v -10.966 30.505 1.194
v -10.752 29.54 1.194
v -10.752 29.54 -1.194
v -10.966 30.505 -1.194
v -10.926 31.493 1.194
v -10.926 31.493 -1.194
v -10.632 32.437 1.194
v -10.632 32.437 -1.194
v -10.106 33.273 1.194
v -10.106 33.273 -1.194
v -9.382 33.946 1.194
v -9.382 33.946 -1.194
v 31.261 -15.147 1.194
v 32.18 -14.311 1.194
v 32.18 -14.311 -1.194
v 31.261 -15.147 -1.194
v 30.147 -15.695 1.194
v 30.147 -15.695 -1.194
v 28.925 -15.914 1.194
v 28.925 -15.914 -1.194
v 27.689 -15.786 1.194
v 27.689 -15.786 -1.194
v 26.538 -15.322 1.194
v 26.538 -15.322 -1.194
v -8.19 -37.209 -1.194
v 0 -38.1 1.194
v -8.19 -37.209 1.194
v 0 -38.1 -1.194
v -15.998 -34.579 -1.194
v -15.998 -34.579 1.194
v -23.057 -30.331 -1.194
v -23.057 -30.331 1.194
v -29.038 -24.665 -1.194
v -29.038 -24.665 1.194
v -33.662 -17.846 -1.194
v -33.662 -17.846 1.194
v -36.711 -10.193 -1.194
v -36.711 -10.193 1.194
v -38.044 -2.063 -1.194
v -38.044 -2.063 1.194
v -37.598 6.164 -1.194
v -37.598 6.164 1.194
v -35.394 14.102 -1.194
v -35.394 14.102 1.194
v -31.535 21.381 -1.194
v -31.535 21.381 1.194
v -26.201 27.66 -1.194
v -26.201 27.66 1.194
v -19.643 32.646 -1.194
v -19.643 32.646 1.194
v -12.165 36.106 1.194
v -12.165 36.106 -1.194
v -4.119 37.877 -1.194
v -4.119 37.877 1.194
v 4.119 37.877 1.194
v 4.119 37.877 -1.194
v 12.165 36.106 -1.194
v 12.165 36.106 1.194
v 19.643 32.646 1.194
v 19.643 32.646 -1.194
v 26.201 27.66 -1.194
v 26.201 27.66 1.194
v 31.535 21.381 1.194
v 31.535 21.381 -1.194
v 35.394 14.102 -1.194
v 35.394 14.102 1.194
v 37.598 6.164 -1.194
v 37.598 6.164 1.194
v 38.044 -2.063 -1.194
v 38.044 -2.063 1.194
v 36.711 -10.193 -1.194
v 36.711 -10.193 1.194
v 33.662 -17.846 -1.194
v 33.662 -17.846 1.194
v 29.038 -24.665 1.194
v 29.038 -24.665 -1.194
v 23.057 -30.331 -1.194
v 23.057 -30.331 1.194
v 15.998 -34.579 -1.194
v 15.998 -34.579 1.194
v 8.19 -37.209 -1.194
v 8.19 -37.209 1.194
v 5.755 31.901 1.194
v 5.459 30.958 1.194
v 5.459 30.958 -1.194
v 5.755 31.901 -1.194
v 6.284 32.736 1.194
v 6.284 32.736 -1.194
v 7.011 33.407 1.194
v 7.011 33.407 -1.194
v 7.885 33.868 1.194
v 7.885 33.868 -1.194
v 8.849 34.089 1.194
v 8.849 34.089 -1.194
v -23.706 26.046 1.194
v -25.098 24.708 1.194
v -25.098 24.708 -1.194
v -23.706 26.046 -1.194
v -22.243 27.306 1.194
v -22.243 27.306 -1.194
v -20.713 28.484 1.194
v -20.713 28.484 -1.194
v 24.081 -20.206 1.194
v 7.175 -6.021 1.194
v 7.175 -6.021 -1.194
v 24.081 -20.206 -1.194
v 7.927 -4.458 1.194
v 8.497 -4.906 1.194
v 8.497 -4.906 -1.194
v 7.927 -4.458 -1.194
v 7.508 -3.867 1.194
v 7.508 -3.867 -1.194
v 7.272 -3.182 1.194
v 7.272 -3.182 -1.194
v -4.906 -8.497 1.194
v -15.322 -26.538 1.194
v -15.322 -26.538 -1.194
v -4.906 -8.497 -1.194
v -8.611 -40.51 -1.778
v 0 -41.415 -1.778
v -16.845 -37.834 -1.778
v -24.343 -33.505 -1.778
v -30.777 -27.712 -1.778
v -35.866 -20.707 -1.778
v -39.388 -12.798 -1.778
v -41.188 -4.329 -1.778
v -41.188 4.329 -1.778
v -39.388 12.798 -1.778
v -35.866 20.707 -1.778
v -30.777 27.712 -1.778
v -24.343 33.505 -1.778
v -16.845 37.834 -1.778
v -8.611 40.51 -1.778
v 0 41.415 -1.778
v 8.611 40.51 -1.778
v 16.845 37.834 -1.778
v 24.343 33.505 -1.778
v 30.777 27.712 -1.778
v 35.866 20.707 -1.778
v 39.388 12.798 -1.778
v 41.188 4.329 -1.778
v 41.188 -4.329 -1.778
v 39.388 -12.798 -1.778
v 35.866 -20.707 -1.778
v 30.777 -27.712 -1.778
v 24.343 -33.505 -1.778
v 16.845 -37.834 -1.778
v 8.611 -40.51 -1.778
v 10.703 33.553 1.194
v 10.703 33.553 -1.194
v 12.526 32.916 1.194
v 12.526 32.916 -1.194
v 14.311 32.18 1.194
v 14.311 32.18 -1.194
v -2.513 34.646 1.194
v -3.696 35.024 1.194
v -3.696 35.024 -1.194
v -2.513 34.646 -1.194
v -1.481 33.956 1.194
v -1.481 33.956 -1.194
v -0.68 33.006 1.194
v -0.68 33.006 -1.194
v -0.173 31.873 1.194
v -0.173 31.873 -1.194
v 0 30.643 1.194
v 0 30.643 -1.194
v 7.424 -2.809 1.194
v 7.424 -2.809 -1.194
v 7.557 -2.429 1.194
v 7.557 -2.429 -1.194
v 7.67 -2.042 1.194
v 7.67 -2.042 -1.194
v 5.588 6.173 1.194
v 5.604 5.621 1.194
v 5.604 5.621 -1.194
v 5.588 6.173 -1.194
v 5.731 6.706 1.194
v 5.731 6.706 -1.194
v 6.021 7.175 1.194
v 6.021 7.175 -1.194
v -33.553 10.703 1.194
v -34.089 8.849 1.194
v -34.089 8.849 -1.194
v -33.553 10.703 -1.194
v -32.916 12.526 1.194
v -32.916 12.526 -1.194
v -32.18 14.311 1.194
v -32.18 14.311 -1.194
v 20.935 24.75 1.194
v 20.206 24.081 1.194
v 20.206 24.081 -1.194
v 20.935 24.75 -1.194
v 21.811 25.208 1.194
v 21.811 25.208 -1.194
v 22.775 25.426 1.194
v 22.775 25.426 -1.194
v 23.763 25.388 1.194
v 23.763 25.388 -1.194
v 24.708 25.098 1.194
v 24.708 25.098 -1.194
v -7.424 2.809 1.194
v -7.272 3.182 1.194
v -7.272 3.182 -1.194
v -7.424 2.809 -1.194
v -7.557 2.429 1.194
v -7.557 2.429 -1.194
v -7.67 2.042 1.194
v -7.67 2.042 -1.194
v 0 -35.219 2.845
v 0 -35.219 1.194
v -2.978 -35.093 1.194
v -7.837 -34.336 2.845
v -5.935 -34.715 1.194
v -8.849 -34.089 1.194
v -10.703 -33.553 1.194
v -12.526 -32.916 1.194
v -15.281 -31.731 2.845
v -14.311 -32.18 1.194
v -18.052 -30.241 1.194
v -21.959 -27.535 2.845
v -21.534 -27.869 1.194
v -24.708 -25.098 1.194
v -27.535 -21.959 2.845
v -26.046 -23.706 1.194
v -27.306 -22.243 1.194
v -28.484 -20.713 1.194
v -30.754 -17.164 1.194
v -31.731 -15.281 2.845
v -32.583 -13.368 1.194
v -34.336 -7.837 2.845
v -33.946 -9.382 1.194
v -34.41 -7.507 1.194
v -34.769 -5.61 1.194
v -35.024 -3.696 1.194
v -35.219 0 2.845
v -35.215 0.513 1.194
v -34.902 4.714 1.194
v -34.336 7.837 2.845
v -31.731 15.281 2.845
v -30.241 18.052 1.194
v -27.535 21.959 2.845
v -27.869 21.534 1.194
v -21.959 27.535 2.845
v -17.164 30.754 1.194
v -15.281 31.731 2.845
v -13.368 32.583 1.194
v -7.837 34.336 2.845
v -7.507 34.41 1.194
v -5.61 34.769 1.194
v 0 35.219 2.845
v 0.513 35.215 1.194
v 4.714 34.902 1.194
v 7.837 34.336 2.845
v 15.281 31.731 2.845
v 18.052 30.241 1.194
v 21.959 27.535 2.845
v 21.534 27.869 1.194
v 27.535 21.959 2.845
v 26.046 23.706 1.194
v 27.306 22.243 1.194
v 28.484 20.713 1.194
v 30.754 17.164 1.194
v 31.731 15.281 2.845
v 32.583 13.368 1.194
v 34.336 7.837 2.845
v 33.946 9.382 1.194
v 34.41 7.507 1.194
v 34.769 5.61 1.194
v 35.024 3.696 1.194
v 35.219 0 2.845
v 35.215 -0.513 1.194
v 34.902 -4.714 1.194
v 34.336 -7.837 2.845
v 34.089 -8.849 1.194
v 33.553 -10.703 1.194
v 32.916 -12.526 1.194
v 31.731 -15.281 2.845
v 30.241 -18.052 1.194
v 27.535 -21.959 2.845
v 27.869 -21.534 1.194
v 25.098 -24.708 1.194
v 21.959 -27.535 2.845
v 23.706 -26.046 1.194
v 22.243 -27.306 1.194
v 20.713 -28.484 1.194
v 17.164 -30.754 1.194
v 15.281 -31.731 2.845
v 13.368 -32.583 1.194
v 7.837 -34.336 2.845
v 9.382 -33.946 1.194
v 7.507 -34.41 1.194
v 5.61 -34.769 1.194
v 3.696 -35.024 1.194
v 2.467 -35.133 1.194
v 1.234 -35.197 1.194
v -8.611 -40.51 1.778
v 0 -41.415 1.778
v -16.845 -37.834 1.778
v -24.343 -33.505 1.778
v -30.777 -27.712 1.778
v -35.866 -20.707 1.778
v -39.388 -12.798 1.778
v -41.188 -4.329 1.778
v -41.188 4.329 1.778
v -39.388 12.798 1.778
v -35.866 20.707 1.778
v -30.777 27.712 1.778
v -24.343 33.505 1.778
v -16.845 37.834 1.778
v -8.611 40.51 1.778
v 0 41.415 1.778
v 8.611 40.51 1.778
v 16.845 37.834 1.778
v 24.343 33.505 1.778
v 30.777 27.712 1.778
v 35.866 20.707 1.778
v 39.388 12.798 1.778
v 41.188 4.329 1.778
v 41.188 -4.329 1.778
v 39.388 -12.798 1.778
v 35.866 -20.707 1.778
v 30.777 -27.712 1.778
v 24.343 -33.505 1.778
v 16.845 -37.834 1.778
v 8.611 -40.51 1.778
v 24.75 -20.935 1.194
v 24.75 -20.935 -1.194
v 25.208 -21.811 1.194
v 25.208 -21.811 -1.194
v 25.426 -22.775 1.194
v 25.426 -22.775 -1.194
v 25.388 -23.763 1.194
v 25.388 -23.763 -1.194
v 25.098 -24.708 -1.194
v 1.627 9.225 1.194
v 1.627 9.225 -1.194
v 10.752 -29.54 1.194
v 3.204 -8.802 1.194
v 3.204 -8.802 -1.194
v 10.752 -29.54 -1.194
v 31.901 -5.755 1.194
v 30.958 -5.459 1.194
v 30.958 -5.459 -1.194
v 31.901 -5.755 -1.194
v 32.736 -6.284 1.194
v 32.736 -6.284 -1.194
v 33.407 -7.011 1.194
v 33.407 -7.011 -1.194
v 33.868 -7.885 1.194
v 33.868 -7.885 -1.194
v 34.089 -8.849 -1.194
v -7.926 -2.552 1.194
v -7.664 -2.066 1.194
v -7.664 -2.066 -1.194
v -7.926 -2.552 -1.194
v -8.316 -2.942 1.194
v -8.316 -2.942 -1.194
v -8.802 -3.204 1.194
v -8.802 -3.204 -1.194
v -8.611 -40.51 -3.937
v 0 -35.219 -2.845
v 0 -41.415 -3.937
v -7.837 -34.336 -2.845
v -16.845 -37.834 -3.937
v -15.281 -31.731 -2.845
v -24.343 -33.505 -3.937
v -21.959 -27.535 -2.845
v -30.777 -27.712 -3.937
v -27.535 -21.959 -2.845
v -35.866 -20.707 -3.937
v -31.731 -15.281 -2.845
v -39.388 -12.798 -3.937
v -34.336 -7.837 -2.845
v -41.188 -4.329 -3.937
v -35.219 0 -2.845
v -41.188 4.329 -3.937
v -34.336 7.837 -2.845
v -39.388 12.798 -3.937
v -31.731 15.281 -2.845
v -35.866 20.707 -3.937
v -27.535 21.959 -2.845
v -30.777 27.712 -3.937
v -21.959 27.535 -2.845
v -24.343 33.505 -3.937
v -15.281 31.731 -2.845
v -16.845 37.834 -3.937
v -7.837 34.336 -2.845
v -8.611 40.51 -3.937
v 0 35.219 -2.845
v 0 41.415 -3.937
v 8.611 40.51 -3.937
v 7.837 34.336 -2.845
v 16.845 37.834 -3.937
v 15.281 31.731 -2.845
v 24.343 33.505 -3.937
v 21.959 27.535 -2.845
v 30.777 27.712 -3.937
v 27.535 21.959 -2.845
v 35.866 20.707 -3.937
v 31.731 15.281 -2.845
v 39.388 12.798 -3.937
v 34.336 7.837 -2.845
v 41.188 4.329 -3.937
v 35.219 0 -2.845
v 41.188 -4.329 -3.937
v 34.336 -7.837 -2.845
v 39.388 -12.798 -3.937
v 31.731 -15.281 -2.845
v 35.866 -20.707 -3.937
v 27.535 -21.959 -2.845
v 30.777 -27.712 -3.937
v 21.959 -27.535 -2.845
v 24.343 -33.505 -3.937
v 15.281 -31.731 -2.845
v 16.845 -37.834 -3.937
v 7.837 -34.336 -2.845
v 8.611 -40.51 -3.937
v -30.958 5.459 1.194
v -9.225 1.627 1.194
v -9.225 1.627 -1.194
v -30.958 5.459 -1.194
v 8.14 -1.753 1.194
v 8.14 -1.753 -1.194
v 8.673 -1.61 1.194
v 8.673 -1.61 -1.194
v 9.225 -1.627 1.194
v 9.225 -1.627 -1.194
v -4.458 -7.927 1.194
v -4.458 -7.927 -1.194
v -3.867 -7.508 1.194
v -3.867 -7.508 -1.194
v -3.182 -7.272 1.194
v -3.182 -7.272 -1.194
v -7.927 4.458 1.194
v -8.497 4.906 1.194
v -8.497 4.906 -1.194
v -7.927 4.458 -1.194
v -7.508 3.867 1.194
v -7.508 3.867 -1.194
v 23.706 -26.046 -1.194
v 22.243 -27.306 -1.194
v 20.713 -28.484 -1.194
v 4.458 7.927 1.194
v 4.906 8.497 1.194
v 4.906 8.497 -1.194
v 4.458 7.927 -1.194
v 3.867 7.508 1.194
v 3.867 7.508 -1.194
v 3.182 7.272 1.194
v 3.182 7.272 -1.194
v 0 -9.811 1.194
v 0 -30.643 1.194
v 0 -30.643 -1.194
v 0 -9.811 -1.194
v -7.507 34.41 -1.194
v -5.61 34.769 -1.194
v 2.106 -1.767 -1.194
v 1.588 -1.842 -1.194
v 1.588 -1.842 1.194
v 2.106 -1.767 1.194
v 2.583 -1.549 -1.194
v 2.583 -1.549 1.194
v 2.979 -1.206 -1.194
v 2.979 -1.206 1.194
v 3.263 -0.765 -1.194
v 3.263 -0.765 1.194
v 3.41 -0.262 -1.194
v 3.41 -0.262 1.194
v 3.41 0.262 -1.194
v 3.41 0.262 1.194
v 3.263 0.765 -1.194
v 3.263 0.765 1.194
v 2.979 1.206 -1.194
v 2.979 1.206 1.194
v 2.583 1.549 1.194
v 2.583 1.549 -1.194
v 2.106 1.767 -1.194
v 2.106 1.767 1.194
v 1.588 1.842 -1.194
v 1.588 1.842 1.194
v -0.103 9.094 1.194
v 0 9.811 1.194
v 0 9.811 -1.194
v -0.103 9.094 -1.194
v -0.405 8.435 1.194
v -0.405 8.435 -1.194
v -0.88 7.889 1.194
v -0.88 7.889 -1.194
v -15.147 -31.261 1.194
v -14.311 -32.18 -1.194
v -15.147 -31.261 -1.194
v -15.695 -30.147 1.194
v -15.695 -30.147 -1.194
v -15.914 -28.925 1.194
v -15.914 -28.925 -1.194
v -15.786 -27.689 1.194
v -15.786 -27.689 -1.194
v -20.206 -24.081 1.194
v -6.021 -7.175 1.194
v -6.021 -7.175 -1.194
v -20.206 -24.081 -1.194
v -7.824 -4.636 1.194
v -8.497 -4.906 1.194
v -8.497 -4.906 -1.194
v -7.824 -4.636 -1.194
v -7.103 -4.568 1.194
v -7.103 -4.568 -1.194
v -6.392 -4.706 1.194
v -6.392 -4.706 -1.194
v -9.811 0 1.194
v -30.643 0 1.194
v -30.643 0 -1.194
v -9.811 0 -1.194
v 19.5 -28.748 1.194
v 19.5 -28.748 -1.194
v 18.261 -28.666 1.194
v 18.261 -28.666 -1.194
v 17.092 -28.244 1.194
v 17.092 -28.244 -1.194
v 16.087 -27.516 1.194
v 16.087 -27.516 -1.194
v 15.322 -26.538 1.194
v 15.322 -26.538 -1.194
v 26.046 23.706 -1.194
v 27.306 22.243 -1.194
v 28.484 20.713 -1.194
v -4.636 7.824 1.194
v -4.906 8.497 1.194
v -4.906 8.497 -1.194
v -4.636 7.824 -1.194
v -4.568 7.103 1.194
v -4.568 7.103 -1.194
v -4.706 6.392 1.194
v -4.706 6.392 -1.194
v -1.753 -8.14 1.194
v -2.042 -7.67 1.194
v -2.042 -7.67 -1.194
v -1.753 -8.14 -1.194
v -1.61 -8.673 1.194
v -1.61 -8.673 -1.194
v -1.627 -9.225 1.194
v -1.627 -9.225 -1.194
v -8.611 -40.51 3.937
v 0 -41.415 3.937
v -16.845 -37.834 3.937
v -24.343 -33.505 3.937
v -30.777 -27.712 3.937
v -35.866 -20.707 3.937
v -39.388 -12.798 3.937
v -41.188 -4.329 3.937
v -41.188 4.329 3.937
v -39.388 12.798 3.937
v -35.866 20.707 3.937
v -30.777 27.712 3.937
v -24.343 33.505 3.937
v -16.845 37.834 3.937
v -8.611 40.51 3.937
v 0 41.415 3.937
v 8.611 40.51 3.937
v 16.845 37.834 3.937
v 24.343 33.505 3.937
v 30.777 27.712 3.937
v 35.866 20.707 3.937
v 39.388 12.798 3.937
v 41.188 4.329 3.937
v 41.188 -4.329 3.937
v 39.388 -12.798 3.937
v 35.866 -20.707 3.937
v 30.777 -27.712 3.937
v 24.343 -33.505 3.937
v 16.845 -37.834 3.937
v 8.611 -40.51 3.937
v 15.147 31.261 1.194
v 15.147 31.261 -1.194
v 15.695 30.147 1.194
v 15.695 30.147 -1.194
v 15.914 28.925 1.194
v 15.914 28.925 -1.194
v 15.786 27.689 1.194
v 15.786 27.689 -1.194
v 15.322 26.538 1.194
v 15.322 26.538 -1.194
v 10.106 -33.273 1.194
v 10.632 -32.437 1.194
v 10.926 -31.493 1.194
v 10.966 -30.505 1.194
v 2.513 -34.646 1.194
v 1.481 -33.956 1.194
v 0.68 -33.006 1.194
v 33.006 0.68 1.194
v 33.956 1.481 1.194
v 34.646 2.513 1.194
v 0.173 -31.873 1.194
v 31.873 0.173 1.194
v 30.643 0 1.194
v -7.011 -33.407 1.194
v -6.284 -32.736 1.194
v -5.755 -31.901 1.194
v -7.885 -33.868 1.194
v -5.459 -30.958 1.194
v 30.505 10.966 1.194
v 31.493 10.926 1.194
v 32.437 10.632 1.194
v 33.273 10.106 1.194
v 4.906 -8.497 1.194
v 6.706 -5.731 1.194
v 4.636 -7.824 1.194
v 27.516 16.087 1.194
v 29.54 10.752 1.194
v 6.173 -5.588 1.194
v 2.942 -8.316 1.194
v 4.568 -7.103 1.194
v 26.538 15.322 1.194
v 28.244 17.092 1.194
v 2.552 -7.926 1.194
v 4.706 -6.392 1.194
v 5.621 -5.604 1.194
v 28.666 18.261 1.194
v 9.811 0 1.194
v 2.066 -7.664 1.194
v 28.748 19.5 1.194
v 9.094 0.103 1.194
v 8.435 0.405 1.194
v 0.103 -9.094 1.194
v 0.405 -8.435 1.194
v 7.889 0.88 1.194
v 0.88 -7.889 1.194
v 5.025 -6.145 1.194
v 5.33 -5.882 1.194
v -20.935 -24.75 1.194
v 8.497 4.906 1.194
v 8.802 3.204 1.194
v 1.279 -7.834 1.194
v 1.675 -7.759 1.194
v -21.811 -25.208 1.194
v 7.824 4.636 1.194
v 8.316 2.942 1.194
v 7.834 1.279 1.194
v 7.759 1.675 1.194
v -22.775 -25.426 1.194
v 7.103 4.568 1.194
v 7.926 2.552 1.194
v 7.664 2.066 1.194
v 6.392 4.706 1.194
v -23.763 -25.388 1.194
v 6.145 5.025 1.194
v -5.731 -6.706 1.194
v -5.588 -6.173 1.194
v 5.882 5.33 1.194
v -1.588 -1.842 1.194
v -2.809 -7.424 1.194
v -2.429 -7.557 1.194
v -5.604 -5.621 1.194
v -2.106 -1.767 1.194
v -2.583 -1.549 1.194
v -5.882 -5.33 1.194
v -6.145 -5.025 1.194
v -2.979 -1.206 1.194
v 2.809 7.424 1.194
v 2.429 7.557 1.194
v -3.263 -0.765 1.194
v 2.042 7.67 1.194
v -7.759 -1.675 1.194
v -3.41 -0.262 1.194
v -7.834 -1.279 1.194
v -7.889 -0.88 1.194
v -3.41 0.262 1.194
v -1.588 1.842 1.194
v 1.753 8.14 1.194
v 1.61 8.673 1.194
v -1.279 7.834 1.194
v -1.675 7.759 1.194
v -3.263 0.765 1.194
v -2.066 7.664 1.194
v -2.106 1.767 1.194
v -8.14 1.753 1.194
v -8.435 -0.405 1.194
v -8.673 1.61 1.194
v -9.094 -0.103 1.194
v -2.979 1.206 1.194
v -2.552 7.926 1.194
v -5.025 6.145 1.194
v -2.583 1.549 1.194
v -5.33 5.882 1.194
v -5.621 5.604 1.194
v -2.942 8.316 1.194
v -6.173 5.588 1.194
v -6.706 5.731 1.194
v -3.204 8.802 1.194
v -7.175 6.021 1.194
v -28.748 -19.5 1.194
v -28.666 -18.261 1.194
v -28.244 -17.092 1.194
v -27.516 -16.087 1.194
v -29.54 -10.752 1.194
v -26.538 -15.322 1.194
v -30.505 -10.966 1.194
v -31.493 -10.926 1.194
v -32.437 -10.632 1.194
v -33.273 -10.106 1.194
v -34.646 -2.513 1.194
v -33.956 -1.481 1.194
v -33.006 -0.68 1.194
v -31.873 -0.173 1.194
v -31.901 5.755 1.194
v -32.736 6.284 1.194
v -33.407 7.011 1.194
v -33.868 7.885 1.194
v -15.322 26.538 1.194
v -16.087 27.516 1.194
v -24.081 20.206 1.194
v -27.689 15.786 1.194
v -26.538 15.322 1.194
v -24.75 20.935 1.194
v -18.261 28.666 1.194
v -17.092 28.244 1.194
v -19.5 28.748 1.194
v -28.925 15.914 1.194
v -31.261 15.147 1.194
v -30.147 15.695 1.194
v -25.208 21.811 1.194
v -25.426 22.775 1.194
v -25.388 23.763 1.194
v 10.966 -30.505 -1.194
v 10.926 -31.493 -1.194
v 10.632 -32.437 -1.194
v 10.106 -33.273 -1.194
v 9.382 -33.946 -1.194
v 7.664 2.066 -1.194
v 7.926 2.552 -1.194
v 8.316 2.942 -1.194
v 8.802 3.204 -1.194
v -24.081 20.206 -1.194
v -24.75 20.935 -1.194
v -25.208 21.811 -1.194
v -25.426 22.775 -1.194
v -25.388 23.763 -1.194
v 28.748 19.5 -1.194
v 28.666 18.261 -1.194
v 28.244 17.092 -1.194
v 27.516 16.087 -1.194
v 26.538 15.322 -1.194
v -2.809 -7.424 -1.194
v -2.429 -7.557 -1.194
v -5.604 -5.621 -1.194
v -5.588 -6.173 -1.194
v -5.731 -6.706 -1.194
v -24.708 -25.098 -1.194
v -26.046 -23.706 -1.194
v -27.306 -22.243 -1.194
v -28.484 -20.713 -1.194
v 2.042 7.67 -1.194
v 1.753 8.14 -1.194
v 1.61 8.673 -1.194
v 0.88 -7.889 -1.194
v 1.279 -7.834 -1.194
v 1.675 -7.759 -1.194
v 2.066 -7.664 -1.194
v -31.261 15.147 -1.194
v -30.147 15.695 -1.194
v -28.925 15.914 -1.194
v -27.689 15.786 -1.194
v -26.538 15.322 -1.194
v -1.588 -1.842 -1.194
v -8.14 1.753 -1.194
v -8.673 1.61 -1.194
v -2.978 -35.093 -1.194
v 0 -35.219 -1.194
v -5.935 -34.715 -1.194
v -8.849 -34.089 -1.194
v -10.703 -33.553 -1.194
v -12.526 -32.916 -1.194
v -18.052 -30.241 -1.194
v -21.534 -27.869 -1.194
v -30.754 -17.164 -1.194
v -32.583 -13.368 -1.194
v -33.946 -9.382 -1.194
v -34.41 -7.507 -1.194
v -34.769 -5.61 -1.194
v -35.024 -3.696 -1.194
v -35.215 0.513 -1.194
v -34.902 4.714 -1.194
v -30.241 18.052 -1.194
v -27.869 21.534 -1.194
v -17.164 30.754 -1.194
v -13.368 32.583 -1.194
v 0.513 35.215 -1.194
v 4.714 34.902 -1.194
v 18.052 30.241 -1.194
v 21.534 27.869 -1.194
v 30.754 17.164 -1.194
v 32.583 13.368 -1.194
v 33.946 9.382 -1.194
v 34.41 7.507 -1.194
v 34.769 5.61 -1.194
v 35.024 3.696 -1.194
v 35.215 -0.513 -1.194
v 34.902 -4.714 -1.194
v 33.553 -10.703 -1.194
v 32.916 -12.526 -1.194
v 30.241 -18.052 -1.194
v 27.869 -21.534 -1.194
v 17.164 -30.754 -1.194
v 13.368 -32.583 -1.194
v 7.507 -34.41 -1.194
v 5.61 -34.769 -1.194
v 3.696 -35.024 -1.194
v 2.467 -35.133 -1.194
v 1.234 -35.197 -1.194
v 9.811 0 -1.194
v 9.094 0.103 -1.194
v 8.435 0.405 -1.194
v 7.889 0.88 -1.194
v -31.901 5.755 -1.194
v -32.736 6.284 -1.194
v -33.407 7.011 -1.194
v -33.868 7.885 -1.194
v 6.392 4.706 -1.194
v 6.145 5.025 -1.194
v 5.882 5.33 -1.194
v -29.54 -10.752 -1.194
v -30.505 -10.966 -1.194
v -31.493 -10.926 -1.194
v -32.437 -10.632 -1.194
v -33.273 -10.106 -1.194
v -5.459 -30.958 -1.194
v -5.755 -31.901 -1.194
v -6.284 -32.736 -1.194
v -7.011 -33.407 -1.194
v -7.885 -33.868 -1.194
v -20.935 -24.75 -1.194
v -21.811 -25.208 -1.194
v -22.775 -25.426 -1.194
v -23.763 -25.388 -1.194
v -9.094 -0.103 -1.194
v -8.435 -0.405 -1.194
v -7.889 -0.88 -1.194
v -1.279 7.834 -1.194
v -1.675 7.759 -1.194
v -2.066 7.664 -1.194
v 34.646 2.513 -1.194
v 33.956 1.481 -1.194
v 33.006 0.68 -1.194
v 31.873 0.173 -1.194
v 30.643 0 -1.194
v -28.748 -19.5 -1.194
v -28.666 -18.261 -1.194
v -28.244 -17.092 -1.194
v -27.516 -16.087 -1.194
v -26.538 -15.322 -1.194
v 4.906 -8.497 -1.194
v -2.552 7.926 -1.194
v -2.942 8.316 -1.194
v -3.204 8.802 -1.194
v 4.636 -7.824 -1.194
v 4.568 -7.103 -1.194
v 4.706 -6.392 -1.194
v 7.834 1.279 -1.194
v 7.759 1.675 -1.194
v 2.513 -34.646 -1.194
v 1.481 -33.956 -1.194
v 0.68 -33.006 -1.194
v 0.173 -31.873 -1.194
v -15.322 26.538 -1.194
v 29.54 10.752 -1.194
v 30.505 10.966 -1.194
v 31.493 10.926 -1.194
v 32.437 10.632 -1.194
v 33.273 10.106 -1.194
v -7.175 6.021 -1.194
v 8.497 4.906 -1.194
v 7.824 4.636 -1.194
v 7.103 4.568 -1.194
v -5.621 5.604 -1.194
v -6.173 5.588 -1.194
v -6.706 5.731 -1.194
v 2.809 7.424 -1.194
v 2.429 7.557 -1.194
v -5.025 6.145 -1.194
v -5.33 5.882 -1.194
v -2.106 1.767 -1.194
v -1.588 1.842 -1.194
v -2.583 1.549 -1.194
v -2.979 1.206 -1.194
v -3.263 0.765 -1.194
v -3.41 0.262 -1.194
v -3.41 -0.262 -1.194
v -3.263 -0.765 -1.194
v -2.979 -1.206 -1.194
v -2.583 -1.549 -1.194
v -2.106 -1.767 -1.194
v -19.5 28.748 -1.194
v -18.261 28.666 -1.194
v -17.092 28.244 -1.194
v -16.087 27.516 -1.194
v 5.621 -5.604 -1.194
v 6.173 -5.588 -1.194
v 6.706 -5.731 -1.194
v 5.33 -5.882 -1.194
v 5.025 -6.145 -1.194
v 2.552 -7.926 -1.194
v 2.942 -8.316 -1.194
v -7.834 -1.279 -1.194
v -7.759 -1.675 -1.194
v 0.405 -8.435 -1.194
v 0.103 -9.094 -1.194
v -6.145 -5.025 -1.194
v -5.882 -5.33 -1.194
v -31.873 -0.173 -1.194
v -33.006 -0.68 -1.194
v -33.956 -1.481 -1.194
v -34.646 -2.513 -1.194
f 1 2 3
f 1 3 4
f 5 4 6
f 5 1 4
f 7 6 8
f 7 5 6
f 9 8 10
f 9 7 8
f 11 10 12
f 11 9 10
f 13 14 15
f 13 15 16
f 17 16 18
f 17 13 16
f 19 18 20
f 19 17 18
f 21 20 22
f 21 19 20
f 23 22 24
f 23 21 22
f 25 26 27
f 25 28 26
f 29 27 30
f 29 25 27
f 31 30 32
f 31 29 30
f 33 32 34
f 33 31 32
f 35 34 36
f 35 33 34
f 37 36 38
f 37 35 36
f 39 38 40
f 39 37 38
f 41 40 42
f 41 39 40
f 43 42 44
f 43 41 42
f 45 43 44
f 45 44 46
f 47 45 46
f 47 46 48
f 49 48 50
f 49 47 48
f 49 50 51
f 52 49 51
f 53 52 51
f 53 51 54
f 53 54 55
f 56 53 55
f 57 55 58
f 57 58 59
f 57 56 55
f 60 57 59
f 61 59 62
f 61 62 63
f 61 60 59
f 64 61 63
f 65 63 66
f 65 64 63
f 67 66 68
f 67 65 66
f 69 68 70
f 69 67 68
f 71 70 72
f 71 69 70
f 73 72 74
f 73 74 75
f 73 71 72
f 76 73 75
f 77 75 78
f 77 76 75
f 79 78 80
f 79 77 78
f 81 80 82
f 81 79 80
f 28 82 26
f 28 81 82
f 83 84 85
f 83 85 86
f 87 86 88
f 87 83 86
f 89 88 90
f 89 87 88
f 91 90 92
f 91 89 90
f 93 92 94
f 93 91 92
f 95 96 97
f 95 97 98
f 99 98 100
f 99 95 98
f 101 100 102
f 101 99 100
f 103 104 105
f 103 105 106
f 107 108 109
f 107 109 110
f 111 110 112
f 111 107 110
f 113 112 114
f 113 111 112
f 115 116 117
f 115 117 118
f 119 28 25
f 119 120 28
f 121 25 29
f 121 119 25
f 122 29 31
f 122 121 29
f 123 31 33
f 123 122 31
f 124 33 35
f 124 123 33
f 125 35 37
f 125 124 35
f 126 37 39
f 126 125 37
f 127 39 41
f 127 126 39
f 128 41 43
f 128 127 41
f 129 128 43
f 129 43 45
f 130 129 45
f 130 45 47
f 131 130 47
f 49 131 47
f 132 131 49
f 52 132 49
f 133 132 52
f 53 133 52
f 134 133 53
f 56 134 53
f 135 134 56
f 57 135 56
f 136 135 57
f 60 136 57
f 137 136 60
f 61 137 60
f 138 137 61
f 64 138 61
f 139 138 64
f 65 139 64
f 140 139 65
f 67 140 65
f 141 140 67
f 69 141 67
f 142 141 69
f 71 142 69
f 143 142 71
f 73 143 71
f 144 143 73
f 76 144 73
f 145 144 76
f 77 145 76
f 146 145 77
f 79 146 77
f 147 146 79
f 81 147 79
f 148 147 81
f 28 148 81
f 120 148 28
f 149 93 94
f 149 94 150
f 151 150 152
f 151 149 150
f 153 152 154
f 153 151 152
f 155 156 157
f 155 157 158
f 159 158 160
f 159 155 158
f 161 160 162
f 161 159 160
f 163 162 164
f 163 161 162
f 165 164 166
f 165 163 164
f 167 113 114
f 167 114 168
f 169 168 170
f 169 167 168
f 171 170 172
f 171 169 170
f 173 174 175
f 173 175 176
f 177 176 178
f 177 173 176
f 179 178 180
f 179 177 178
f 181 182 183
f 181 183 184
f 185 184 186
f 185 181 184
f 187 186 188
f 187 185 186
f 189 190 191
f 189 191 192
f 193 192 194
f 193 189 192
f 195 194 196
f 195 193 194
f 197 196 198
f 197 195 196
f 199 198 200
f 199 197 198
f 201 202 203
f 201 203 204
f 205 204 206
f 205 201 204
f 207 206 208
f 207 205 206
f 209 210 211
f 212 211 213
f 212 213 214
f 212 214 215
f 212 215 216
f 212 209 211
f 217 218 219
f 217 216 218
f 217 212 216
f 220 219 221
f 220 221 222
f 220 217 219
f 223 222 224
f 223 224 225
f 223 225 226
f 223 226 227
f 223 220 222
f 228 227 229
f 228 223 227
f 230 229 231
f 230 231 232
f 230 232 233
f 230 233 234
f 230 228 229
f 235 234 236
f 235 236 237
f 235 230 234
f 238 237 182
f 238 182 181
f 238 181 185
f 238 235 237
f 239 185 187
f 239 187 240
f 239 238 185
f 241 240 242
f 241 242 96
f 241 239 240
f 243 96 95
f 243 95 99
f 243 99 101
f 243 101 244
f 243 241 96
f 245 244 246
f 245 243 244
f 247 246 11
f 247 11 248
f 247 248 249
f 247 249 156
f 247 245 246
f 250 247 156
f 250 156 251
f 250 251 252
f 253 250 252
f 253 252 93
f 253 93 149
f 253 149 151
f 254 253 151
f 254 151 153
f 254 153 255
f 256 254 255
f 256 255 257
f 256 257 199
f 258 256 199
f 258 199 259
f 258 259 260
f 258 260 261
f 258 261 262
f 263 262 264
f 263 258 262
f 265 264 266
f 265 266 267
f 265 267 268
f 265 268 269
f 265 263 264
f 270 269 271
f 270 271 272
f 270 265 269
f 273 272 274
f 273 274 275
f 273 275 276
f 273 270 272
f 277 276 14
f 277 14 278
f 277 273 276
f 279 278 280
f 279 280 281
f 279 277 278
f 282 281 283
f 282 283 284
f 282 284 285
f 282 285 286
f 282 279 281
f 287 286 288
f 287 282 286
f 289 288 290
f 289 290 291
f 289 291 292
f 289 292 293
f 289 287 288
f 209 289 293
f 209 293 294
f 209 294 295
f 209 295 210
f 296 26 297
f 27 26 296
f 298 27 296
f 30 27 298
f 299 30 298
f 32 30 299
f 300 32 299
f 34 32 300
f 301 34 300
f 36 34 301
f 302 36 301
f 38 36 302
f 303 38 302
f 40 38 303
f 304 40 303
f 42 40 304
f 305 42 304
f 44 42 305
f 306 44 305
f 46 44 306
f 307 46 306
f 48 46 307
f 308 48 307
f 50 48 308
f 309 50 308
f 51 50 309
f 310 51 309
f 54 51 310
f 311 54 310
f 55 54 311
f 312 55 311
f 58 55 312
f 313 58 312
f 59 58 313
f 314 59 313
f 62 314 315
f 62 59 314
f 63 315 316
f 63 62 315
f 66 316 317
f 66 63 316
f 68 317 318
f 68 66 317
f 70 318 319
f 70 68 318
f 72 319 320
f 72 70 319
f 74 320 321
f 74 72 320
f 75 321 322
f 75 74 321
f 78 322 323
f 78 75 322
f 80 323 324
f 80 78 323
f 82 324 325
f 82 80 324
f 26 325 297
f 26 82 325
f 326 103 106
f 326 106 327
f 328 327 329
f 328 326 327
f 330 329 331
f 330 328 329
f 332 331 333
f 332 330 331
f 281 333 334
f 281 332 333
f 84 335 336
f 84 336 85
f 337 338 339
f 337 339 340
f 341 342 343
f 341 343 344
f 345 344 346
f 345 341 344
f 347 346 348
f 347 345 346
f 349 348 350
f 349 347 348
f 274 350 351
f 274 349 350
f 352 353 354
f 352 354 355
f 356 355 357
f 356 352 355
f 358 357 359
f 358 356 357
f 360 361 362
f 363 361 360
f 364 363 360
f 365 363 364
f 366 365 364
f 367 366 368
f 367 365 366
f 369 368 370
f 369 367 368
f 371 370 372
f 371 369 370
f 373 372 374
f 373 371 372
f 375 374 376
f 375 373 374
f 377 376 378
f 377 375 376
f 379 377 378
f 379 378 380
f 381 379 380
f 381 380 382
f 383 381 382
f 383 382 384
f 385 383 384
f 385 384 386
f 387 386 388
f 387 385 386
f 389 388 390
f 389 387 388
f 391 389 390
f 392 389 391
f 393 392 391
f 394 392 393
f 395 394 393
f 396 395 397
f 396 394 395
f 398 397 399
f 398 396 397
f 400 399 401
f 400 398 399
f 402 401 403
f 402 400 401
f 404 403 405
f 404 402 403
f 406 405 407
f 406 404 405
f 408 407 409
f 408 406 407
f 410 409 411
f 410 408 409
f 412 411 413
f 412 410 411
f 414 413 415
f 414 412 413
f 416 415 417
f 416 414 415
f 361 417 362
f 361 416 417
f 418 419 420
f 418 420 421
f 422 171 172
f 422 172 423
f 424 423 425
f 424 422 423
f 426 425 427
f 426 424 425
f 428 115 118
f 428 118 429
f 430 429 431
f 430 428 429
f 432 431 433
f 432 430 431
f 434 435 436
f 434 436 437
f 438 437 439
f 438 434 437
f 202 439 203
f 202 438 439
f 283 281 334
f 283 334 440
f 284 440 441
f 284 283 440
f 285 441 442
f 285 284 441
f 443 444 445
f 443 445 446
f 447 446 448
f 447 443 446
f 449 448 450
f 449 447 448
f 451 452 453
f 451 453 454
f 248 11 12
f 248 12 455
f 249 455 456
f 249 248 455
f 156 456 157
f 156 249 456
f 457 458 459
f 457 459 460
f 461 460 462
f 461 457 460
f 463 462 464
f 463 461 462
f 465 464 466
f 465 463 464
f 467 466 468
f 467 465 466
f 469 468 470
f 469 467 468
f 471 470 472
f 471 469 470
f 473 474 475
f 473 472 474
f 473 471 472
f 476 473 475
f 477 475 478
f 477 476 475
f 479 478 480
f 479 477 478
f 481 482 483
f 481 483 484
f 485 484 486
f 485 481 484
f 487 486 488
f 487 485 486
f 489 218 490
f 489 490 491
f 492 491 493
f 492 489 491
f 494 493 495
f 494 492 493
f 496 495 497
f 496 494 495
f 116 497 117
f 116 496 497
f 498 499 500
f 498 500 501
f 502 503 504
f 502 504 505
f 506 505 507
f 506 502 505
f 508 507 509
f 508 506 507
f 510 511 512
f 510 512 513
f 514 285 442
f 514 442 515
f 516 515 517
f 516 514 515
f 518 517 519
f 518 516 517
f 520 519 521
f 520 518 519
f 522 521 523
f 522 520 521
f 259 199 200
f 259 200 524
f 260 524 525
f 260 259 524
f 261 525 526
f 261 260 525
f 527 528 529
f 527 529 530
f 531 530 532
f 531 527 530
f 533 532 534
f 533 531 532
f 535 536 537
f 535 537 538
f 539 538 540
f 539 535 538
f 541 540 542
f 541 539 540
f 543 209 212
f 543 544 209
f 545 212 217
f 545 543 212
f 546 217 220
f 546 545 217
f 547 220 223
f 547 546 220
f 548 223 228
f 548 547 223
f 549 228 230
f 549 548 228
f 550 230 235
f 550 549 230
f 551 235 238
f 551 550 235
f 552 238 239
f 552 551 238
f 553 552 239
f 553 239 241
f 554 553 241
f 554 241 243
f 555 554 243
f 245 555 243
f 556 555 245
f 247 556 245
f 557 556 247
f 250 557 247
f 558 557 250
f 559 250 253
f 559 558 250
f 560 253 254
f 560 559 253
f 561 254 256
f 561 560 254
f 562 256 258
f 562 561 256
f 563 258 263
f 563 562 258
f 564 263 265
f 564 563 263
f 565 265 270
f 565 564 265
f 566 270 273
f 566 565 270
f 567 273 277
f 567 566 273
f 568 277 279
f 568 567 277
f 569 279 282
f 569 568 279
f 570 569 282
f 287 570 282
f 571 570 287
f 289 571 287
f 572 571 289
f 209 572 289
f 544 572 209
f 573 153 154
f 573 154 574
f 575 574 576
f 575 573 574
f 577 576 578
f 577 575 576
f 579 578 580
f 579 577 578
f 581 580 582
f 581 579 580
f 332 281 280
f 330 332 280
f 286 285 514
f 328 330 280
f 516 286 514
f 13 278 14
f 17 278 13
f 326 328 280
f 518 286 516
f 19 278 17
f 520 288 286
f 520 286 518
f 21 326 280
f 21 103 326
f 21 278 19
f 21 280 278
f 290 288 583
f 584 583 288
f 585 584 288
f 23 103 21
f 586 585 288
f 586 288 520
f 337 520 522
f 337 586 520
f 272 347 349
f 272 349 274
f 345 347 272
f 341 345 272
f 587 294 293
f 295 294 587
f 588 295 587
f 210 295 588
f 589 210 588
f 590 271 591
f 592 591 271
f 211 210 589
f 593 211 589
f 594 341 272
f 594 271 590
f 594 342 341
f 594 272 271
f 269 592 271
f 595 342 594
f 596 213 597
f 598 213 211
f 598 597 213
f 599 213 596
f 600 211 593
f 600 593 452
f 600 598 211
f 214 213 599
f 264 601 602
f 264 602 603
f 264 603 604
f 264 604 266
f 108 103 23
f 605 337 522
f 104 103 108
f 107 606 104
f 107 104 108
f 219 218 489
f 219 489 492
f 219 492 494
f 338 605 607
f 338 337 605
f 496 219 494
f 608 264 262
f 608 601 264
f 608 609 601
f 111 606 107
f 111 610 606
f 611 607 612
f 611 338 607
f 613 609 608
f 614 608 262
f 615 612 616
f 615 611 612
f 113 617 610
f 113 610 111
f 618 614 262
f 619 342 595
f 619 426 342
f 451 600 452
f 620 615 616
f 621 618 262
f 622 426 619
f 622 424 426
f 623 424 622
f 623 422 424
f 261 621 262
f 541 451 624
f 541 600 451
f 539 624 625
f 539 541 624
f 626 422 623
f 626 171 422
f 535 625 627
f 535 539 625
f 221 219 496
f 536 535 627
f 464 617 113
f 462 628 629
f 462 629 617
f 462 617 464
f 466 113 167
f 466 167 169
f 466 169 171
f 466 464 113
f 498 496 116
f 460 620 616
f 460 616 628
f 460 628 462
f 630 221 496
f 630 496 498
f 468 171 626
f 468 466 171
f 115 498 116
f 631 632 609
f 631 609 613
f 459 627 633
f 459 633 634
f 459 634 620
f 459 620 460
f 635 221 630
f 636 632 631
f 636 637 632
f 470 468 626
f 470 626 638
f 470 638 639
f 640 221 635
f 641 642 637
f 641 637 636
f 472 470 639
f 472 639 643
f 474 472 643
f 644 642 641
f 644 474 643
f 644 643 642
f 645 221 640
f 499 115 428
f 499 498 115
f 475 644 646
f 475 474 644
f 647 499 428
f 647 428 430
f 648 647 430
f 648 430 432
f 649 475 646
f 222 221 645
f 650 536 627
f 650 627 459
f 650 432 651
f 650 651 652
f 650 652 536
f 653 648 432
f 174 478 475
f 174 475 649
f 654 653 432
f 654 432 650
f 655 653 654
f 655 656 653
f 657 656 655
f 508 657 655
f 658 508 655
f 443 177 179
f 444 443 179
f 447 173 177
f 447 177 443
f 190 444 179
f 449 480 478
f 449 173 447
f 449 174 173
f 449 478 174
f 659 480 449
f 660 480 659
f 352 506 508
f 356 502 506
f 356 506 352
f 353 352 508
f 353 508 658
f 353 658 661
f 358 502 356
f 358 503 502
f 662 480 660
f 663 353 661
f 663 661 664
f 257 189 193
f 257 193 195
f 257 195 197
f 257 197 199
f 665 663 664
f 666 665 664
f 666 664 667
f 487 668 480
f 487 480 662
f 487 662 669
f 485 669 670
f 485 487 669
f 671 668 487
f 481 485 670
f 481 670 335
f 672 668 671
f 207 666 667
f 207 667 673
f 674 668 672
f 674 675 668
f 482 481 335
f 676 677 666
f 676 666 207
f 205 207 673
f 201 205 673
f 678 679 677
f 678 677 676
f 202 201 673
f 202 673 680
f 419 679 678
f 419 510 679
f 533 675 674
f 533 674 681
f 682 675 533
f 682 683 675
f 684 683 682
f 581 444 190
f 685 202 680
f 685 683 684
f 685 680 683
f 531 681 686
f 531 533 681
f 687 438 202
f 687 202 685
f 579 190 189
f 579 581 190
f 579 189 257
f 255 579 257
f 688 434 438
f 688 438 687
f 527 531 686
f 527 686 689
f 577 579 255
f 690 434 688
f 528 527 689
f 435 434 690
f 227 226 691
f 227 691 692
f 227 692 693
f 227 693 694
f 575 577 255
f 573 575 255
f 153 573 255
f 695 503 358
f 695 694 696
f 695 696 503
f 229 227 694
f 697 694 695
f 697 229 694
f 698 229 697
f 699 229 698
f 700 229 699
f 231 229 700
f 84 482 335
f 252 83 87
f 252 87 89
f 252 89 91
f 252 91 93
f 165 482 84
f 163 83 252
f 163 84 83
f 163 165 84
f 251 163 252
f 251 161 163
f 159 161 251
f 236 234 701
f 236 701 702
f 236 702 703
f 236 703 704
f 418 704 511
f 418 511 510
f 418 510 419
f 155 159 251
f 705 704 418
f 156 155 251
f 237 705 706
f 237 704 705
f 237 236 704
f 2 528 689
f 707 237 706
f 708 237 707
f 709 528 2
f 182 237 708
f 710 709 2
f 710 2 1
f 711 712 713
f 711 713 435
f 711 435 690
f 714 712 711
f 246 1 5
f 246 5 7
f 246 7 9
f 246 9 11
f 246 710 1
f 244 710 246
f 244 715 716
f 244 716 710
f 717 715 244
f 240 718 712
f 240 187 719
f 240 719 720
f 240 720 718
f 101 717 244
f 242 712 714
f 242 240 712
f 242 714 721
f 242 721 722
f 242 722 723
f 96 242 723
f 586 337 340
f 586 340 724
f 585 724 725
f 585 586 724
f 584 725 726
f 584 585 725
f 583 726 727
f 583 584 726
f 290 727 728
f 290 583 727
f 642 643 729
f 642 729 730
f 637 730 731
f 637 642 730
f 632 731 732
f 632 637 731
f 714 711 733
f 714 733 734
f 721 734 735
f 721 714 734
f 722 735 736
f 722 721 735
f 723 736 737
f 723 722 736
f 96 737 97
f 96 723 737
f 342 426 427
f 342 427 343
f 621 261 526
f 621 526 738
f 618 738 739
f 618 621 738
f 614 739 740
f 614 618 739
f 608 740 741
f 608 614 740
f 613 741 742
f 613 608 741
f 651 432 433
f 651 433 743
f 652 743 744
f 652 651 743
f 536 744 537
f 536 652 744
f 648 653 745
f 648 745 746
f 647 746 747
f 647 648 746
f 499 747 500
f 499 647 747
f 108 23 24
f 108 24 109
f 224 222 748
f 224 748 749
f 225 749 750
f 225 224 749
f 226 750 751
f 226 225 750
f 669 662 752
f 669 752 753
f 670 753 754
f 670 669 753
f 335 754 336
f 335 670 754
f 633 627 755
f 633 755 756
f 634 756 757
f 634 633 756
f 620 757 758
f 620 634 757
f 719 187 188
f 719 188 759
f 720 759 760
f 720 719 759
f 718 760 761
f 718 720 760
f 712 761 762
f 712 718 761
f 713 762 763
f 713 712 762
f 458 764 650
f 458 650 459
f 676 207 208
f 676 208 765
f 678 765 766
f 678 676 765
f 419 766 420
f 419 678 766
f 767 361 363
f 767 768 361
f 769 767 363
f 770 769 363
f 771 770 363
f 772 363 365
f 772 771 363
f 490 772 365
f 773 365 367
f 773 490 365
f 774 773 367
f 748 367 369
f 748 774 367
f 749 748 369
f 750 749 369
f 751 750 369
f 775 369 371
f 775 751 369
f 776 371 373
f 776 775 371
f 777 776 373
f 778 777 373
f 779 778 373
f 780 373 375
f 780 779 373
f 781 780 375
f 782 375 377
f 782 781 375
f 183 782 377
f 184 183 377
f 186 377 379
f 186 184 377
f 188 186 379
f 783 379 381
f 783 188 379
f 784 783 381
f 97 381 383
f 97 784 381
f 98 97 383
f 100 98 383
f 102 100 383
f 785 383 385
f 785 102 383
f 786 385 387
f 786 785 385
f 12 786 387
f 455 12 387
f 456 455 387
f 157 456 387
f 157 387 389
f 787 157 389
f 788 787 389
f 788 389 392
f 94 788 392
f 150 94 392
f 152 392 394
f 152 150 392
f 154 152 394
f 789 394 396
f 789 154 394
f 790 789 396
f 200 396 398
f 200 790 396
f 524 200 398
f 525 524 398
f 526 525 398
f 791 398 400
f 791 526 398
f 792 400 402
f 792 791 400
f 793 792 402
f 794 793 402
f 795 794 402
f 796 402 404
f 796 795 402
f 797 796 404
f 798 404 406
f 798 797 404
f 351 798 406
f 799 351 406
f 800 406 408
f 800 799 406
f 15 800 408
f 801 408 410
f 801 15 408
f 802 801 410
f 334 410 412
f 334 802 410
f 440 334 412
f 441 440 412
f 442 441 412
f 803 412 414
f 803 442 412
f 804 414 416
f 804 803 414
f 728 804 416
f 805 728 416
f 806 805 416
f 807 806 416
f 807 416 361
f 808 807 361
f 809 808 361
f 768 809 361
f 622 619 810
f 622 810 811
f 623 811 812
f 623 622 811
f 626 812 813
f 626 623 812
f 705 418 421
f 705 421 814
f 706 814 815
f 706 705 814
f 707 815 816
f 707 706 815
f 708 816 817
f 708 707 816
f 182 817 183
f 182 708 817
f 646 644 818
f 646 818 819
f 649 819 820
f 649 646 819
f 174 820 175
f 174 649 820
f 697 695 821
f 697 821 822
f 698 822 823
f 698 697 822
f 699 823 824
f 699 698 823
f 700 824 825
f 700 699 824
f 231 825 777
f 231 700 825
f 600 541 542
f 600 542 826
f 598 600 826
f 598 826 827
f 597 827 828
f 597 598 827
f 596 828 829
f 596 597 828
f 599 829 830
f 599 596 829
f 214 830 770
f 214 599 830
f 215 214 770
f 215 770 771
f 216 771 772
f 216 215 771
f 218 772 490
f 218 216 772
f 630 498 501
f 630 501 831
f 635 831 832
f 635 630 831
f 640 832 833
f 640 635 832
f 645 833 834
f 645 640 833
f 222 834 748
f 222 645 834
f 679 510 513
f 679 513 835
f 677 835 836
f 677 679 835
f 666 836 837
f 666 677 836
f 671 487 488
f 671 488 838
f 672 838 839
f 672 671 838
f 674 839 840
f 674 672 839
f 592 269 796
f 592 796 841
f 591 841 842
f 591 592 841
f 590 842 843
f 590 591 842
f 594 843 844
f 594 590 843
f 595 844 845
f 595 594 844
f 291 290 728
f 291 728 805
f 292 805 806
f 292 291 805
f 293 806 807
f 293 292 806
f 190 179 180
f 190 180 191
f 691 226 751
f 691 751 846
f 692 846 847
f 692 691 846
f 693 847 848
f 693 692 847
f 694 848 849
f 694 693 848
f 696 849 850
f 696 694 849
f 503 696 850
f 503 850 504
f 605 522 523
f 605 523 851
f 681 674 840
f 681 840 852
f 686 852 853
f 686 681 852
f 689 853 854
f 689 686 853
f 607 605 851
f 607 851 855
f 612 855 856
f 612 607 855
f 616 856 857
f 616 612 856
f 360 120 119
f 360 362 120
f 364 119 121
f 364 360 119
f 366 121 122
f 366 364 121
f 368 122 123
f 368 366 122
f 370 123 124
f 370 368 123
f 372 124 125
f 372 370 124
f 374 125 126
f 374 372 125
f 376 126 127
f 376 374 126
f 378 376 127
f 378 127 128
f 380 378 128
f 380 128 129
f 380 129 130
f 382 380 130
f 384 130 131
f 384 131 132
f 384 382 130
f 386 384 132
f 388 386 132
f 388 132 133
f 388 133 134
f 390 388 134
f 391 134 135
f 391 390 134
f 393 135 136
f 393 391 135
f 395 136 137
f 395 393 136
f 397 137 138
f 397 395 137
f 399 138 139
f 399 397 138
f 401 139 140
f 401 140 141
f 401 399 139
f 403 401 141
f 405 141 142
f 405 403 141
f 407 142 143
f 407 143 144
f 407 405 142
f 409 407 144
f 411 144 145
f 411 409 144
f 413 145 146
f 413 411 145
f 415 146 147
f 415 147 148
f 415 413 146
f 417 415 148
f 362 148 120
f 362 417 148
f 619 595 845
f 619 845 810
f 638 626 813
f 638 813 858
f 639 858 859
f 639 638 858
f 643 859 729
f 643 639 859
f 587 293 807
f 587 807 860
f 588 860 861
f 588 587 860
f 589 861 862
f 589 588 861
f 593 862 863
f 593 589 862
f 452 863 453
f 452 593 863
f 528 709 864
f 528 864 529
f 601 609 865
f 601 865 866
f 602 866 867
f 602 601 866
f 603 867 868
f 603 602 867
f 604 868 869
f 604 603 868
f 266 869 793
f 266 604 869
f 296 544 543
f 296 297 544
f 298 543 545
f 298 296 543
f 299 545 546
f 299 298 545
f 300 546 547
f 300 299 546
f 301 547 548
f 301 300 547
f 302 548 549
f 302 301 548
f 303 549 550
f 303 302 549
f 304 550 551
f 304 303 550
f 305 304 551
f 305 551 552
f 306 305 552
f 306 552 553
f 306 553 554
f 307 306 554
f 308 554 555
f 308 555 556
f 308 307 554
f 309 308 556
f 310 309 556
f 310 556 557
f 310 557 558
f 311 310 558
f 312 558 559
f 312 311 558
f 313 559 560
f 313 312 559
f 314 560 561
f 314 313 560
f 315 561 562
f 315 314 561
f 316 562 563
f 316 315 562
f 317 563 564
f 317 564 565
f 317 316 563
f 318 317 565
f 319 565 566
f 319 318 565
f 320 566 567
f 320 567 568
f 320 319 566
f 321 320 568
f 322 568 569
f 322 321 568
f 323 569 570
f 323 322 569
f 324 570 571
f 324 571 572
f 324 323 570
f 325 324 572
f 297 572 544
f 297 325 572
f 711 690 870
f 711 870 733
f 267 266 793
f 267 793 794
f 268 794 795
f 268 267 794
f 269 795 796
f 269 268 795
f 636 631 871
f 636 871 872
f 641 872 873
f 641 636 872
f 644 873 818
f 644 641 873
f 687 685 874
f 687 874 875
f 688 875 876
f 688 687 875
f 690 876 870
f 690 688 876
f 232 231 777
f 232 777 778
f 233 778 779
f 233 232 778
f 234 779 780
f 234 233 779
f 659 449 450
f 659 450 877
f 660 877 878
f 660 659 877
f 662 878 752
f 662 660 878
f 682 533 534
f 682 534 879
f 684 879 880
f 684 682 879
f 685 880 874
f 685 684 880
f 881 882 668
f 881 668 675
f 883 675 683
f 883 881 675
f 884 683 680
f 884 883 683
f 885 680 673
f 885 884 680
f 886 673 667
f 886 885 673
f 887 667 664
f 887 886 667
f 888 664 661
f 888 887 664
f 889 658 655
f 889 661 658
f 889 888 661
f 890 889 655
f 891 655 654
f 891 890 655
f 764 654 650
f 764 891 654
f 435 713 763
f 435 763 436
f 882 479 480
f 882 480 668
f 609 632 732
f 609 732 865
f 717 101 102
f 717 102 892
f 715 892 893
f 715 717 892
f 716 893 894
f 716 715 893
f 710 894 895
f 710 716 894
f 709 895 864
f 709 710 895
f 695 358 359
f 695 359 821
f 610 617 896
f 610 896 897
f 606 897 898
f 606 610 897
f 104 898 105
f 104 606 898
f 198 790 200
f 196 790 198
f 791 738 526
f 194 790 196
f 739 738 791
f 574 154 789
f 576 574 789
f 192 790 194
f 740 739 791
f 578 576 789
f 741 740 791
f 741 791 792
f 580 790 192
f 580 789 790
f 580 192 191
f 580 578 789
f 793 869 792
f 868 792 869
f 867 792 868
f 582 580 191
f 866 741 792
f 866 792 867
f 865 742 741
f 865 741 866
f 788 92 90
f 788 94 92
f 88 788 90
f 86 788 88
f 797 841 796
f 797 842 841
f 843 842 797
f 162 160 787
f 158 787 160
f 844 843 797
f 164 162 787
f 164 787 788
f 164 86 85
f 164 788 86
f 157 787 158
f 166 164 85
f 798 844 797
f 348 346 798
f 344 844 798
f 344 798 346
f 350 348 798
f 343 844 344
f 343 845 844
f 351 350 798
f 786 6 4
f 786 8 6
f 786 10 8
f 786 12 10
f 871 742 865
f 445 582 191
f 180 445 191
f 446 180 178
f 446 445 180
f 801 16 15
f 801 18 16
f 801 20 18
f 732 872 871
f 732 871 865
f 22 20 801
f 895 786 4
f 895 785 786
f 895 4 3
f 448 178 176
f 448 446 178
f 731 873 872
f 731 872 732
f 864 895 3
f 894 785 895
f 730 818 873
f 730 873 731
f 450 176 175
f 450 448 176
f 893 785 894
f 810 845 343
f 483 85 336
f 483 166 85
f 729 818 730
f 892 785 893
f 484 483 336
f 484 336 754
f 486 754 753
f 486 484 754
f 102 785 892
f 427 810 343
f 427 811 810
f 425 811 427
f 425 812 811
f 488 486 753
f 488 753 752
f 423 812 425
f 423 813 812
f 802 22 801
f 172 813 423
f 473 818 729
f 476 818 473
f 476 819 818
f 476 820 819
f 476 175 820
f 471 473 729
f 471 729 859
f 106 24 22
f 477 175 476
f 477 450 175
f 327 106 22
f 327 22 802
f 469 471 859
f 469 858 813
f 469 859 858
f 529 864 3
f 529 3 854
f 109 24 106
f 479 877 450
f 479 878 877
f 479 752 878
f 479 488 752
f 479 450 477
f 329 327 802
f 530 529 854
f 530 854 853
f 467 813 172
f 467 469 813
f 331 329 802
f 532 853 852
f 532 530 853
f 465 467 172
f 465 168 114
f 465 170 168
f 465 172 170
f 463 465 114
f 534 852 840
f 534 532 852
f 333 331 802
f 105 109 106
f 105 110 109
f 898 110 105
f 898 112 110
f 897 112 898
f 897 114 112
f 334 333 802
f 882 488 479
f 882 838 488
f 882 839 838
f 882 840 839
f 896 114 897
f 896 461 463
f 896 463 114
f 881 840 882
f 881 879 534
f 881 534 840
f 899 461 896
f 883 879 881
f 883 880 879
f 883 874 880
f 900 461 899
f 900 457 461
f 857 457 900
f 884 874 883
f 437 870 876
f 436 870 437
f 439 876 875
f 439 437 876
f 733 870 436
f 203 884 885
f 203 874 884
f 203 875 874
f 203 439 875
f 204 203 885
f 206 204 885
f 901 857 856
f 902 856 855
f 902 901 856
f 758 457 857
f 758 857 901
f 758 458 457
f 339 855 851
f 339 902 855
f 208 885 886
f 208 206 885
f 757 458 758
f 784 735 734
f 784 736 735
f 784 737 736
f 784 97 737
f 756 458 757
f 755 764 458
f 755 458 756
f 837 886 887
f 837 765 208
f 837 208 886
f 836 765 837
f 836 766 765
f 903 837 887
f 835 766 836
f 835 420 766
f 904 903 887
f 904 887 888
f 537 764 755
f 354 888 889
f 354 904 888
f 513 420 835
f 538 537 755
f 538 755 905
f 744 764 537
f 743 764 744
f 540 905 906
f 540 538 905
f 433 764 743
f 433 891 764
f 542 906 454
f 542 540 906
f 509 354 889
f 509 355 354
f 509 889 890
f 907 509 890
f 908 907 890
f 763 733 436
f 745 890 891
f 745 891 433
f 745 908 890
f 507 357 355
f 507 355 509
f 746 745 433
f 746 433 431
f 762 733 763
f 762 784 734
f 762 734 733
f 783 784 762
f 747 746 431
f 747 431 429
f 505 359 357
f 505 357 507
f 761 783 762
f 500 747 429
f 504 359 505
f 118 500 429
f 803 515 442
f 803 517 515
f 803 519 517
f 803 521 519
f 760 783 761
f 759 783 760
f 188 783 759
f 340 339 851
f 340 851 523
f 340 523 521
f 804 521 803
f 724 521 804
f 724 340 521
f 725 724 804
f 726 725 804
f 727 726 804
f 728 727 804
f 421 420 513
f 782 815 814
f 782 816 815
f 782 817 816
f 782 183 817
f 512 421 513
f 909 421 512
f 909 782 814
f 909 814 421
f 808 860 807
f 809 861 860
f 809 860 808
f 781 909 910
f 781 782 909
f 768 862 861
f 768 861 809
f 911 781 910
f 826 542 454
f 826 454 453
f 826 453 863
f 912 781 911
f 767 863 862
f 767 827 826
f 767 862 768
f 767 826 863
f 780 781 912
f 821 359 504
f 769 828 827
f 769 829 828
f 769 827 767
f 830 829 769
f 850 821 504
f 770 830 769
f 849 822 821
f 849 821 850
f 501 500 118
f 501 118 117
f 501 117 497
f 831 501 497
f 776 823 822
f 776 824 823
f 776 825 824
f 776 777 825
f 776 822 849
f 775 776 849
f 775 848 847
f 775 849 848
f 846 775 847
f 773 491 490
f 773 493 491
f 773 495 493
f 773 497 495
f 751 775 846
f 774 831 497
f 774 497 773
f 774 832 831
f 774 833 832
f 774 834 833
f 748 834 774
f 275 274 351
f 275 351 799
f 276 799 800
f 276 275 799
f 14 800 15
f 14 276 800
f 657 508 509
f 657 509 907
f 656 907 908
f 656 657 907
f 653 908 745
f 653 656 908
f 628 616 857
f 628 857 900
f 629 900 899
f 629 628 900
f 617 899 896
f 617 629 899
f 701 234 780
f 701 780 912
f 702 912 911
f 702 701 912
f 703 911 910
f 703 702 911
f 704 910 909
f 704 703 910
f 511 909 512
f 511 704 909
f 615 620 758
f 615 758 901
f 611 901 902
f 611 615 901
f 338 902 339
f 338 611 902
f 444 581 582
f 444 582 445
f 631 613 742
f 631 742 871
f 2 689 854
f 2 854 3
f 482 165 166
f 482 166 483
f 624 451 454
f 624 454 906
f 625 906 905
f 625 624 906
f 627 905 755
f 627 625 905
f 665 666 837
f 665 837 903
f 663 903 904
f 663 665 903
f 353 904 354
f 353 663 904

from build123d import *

# Parameters (mm, degrees)
CUT_EXTRUDE3_START = -2.387057914
CUT_EXTRUDE3_DEPTH = 2.387057914
CIRPATTERN2_COUNT  = 12
CUT_EXTRUDE4_DEPTH = 59.793512223


# Read off the part's stored shape, not the designer's step: Cut-Extrude3
with BuildPart() as part:
    # Sketch1 → Revolve1 (revolve)
    with BuildSketch(Plane(origin=(0, 0, 0), x_dir=(0, 0, -1), z_dir=(1, 0, 0)), mode=Mode.PRIVATE) as revolve1_sk:
        Polygon((-1.193528957, 0), (-1.193528957, 35.218988836), (-2.844528957, 35.218988836), (-3.937, 41.4147), (-1.778, 41.4147), (-1.193528957, 38.1), (1.193528957, 38.1), (1.778, 41.4147), (3.937, 41.4147), (2.844528957, 35.218988836), (1.193528957, 35.218988836), (1.193528957, 0), align=None)
    revolve(revolve1_sk.sketch.rotate(Axis((0, 0, 1.193528957), (0, 0, -1)), 180), axis=Axis((0, 0, 1.193528957), (0, 0, -1)))

    # Cut-Extrude3 outline → Cut-Extrude3 (cut)
    with BuildSketch(Plane(origin=(0, 0, -1.193528957), x_dir=(-1, 0, 0), z_dir=(0, 0, -1)).offset(CUT_EXTRUDE3_START)):
        with BuildLine():
            ThreePointArc((2.066345579, 7.663819035), (2.76104062, 8.106910335), (3.203637142, 8.801920708))
            Line((3.203637142, 8.801920708), (10.751653826, 29.539926109))
            ThreePointArc((10.751653826, 29.539926109), (10.809621103, 31.974229594), (9.381543944, 33.946484469))
            ThreePointArc((9.381543944, 33.946484469), (6.561048987, 34.602453827), (3.696198494, 35.02449559))
            ThreePointArc((3.696198494, 35.02449559), (1.047467977, 33.509168244), (0, 30.643020803))
            Line((0, 30.643020803), (0, 9.811006208))
            ThreePointArc((0, 9.811006208), (0.230432564, 8.753888306), (0.879919889, 7.88857701))
            ThreePointArc((0.879919889, 7.88857701), (1.477412972, 7.798792032), (2.066345579, 7.663819035))
        make_face()
    cut_extrude3 = extrude(amount=CUT_EXTRUDE3_DEPTH, mode=Mode.SUBTRACT)

    # CirPattern2: Cut-Extrude3 ×12 about axis
    cirpattern2_axis = Axis((0, 0, 0), (0, 0, 1))
    for i in range(1, CIRPATTERN2_COUNT):
        add(cut_extrude3.rotate(cirpattern2_axis, i * 360 / CIRPATTERN2_COUNT), mode=Mode.SUBTRACT)

    # Sketch2 → Cut-Extrude4 (cut, through all)
    with BuildSketch(Plane(origin=(0, 0, -1.193528957), x_dir=(-1, 0, 0), z_dir=(0, 0, -1))):
        with BuildLine():
            Line((-1.5875, 1.8415), (1.5875, 1.8415))
            ThreePointArc((1.5875, 1.8415), (3.429, 0), (1.5875, -1.8415))
            Line((1.5875, -1.8415), (-1.5875, -1.8415))
            ThreePointArc((-1.5875, -1.8415), (-3.429, 0), (-1.5875, 1.8415))
        make_face()
    extrude(amount=-CUT_EXTRUDE4_DEPTH, mode=Mode.SUBTRACT)


solid = part.part
